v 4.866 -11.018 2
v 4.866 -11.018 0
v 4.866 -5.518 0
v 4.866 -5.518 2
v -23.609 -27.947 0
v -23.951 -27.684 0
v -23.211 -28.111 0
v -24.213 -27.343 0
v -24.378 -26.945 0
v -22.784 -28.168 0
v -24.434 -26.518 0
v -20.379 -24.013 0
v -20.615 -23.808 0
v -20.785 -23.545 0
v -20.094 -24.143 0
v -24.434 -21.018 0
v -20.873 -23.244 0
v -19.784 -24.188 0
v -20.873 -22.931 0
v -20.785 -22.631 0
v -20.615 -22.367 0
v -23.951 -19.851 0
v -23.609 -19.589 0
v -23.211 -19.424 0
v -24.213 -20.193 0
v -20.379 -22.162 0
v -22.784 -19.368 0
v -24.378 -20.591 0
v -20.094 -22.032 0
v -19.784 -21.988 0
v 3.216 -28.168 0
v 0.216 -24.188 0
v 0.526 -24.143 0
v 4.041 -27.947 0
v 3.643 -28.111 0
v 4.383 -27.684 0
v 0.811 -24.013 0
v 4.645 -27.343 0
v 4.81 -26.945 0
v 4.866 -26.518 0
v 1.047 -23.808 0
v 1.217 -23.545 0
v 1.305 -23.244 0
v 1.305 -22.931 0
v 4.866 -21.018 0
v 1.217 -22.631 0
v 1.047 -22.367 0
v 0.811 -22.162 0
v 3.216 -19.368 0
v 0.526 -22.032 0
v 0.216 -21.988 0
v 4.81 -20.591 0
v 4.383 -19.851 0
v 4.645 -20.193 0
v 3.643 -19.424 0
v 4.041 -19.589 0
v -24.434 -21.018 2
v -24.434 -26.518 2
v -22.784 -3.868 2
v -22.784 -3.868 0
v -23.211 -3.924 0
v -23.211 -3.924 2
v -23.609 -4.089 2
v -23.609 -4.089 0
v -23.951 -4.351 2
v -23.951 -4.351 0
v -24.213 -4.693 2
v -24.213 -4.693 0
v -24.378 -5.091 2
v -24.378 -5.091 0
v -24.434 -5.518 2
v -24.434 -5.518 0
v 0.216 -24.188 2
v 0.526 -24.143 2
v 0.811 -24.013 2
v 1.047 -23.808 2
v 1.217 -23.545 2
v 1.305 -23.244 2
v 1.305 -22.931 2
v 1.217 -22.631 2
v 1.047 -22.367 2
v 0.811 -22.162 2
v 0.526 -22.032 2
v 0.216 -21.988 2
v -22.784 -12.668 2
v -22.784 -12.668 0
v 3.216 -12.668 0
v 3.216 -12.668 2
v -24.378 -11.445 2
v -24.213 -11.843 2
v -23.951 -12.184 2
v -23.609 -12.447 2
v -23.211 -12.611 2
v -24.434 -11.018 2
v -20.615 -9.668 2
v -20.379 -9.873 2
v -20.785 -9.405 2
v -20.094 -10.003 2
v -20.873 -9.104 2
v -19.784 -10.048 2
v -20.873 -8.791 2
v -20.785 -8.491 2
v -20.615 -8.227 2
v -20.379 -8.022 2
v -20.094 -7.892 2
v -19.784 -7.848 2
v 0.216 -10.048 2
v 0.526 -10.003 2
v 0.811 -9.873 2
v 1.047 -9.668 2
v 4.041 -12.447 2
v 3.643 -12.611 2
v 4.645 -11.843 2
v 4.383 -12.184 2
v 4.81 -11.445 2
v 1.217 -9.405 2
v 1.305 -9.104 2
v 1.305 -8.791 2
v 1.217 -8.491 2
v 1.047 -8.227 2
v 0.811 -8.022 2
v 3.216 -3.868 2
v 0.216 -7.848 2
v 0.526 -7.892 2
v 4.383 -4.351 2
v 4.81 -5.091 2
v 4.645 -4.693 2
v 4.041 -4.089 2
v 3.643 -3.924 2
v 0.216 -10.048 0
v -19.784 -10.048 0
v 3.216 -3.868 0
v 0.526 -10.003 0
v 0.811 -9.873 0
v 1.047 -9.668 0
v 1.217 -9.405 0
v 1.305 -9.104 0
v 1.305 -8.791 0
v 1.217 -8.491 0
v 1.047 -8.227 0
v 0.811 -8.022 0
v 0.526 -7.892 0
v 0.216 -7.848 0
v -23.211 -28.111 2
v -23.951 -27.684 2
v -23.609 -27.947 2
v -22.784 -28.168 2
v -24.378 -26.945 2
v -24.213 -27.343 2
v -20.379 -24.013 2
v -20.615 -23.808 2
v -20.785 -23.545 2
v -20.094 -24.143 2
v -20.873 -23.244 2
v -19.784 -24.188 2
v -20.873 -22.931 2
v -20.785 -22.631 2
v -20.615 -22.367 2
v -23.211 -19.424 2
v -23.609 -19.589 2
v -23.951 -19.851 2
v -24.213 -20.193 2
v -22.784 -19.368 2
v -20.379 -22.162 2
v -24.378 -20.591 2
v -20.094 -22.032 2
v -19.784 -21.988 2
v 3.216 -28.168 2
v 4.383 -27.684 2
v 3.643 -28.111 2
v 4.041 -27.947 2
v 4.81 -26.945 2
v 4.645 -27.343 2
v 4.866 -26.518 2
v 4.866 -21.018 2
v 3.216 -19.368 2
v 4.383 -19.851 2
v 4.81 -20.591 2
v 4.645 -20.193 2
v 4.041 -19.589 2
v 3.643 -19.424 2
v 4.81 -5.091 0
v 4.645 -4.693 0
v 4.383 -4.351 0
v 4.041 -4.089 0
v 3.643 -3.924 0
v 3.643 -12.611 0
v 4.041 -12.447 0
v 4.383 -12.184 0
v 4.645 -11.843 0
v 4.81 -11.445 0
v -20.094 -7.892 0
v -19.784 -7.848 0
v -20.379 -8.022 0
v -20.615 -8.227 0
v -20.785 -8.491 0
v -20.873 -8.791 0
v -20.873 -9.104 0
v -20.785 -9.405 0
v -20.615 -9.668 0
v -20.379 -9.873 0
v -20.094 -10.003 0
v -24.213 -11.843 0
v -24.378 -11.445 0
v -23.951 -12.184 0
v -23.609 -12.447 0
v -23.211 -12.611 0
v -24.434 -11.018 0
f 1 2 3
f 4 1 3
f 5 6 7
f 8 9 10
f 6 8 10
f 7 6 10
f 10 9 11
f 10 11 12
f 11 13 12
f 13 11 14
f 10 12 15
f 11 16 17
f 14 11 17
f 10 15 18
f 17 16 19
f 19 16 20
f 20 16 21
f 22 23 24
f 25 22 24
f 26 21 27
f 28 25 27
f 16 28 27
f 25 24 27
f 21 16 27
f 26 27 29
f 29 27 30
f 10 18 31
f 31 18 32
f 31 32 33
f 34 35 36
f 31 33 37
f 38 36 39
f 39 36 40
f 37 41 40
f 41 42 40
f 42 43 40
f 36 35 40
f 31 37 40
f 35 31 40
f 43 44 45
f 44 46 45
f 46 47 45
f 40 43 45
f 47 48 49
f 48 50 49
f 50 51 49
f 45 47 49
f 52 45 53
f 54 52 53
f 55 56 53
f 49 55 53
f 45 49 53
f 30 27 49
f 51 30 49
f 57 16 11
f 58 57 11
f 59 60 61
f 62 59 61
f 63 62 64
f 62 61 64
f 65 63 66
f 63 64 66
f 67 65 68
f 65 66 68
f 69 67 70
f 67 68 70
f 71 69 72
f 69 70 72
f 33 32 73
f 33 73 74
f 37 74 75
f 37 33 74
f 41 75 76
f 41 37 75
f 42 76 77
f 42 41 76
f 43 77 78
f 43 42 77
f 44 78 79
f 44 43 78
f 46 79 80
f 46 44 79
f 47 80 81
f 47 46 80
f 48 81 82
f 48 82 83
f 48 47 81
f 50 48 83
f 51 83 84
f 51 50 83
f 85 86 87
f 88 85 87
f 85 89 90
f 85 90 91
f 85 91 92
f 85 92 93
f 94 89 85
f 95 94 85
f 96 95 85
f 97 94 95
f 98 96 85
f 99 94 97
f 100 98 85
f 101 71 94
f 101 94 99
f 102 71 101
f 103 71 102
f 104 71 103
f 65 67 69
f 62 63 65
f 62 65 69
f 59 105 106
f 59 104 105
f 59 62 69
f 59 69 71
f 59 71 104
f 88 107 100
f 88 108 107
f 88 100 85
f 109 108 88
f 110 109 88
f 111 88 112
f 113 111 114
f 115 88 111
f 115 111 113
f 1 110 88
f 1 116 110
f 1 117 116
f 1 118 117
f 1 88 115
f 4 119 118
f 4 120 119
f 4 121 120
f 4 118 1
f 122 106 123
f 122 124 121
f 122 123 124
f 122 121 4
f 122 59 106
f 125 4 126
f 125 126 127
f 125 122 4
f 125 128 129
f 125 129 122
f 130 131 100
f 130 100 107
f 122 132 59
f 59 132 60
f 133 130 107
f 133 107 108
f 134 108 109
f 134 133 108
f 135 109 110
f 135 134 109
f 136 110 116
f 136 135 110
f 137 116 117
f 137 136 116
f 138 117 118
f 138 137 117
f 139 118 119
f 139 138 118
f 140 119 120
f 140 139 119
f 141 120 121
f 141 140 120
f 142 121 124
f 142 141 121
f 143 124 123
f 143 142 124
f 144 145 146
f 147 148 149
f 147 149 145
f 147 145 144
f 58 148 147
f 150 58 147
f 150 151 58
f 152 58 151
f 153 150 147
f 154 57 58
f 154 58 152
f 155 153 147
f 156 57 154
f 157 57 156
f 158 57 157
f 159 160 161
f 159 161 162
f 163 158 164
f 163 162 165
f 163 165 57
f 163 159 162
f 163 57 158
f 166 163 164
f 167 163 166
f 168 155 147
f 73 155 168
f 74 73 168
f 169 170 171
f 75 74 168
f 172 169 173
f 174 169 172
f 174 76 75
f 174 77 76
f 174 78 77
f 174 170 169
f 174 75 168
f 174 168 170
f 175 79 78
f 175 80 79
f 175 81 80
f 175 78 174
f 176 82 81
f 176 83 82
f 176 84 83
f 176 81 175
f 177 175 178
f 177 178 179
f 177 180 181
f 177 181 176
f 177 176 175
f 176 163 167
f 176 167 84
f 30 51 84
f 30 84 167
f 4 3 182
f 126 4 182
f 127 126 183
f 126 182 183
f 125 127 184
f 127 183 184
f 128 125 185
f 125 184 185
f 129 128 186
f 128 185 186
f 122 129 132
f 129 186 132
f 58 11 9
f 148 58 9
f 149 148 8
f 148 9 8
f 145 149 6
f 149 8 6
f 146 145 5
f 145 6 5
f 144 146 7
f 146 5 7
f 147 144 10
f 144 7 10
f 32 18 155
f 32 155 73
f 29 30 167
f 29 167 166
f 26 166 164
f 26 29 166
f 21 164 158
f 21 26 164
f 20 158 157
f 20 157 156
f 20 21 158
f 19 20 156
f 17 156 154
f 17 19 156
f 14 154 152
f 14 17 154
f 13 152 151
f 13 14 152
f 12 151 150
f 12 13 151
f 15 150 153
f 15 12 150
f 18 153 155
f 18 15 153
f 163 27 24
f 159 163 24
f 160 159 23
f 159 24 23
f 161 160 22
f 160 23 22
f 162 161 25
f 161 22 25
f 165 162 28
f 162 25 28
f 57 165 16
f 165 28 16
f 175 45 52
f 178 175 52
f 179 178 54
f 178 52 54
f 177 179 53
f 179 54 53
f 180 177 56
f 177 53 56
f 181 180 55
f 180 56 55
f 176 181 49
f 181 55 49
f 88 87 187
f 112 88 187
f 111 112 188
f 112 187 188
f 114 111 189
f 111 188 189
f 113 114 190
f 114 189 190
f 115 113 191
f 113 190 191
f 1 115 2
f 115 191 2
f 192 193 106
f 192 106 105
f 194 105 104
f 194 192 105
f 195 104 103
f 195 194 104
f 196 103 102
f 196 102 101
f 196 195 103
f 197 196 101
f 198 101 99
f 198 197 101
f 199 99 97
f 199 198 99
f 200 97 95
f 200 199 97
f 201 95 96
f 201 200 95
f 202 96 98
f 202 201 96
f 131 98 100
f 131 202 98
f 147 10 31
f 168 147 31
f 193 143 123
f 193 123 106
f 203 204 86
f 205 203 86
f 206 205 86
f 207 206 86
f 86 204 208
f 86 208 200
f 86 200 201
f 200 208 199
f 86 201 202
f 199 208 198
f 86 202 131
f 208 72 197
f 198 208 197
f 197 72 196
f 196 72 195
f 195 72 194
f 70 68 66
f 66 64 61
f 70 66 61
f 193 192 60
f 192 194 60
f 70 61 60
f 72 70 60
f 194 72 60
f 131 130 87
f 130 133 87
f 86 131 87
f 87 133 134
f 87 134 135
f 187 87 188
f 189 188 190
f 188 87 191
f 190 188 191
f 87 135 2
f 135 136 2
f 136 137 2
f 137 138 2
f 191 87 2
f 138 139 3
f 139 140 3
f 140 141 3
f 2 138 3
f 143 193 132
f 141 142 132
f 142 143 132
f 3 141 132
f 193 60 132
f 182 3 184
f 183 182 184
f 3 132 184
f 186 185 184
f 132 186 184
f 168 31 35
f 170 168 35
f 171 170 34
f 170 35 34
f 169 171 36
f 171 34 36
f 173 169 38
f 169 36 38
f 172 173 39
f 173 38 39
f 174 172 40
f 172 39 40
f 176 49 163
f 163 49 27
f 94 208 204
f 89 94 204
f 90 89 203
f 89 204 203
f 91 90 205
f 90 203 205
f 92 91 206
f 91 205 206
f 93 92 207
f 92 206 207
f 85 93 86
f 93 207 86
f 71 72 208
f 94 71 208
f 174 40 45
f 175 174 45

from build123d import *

# Parameters (mm, degrees)
SALIENTE_EXTRUIR1_DEPTH   = 2
SALIENTE_EXTRUIR1_2_DEPTH = 2
CORTAR_EXTRUIR1_START     = -2
CORTAR_EXTRUIR1_DEPTH     = 2


with BuildPart() as part:
    # Croquis1 → Saliente-Extruir1 (new body)
    with BuildSketch(Plane.XY):
        with BuildLine():
            Line((-24.78394795, -5.517569271), (-24.78394795, -11.017569271))
            ThreePointArc((-24.78394795, -11.017569271), (-24.198161512, -12.431782834), (-22.78394795, -13.017569271))
            Line((-22.78394795, -13.017569271), (3.21605205, -13.017569271))
            ThreePointArc((3.21605205, -13.017569271), (4.630265612, -12.431782834), (5.21605205, -11.017569271))
            Line((5.21605205, -11.017569271), (5.21605205, -5.517569271))
            ThreePointArc((5.21605205, -5.517569271), (4.630265612, -4.103355709), (3.21605205, -3.517569271))
            Line((3.21605205, -3.517569271), (-22.78394795, -3.517569271))
            ThreePointArc((-22.78394795, -3.517569271), (-24.198161512, -4.103355709), (-24.78394795, -5.517569271))
        make_face()
        with BuildLine():
            Line((-19.783948841, -10.047569271), (0.216052941, -10.047569271))
            ThreePointArc((0.216052941, -10.047569271), (1.316052941, -8.947569271), (0.216052941, -7.847569271))
            Line((0.216052941, -7.847569271), (-19.783947059, -7.847569271))
            ThreePointArc((-19.783947059, -7.847569271), (-20.883947954, -8.947568381), (-19.783948841, -10.047569271))
        make_face(mode=Mode.SUBTRACT)
    extrude(amount=SALIENTE_EXTRUIR1_DEPTH)


with BuildPart() as body_2:
    # Croquis1 → Saliente-Extruir1 2 (new body)
    with BuildSketch(Plane.XY):
        with BuildLine():
            Line((5.21605205, -26.517569271), (5.21605205, -21.017569271))
            ThreePointArc((5.21605205, -21.017569271), (4.630265612, -19.603355709), (3.21605205, -19.017569271))
            Line((3.21605205, -19.017569271), (-22.78394795, -19.017569271))
            ThreePointArc((-22.78394795, -19.017569271), (-24.198161512, -19.603355709), (-24.78394795, -21.017569271))
            Line((-24.78394795, -21.017569271), (-24.78394795, -26.517569271))
            ThreePointArc((-24.78394795, -26.517569271), (-24.198161512, -27.931782834), (-22.78394795, -28.517569271))
            Line((-22.78394795, -28.517569271), (3.21605205, -28.517569271))
            ThreePointArc((3.21605205, -28.517569271), (4.630265612, -27.931782834), (5.21605205, -26.517569271))
        make_face()
        with BuildLine():
            Line((-19.783947059, -24.187569271), (0.216052941, -24.187569271))
            ThreePointArc((0.216052941, -24.187569271), (1.316052941, -23.087569271), (0.216052941, -21.987569271))
            Line((0.216052941, -21.987569271), (-19.783948841, -21.987569271))
            ThreePointArc((-19.783948841, -21.987569271), (-20.883947954, -23.087570162), (-19.783947059, -24.187569271))
        make_face(mode=Mode.SUBTRACT)
    extrude(amount=SALIENTE_EXTRUIR1_2_DEPTH)


with BuildPart() as cortar_extruir1_tool:
    # Croquis2 → Cortar-Extruir1 (new body)
    # profile 1 of 2: a face of its own
    with BuildSketch(Plane.XY.offset(2).offset(CORTAR_EXTRUIR1_START)):
        with BuildLine():
            Line((5.21605205, -26.517569271), (5.21605205, -21.017569271))
            ThreePointArc((5.21605205, -21.017569271), (4.630265612, -19.603355709), (3.21605205, -19.017569271))
            Line((3.21605205, -19.017569271), (-22.78394795, -19.017569271))
            ThreePointArc((-22.78394795, -19.017569271), (-24.198161512, -19.603355709), (-24.78394795, -21.017569271))
            Line((-24.78394795, -21.017569271), (-24.78394795, -26.517569271))
            ThreePointArc((-24.78394795, -26.517569271), (-24.198161512, -27.931782834), (-22.78394795, -28.517569271))
            Line((-22.78394795, -28.517569271), (3.21605205, -28.517569271))
            ThreePointArc((3.21605205, -28.517569271), (4.630265612, -27.931782834), (5.21605205, -26.517569271))
        make_face()
        with BuildLine():
            Line((4.86605205, -26.517569271), (4.86605205, -21.017569271))
            ThreePointArc((4.86605205, -21.017569271), (4.382778239, -19.850843082), (3.21605205, -19.367569271))
            Line((3.21605205, -19.367569271), (-22.78394795, -19.367569271))
            ThreePointArc((-22.78394795, -19.367569271), (-23.950674139, -19.850843082), (-24.43394795, -21.017569271))
            Line((-24.43394795, -21.017569271), (-24.43394795, -26.517569271))
            ThreePointArc((-24.43394795, -26.517569271), (-23.950674139, -27.68429546), (-22.78394795, -28.167569271))
            Line((-22.78394795, -28.167569271), (3.21605205, -28.167569271))
            ThreePointArc((3.21605205, -28.167569271), (4.382778239, -27.68429546), (4.86605205, -26.517569271))
        make_face(mode=Mode.SUBTRACT)
    # profile 2 of 2: a face of its own
    with BuildSketch(Plane.XY.offset(2).offset(CORTAR_EXTRUIR1_START)):
        with BuildLine():
            Line((-24.78394795, -5.517569271), (-24.78394795, -11.017569271))
            ThreePointArc((-24.78394795, -11.017569271), (-24.198161512, -12.431782834), (-22.78394795, -13.017569271))
            Line((-22.78394795, -13.017569271), (3.21605205, -13.017569271))
            ThreePointArc((3.21605205, -13.017569271), (4.630265612, -12.431782834), (5.21605205, -11.017569271))
            Line((5.21605205, -11.017569271), (5.21605205, -5.517569271))
            ThreePointArc((5.21605205, -5.517569271), (4.630265612, -4.103355709), (3.21605205, -3.517569271))
            Line((3.21605205, -3.517569271), (-22.78394795, -3.517569271))
            ThreePointArc((-22.78394795, -3.517569271), (-24.198161512, -4.103355709), (-24.78394795, -5.517569271))
        make_face()
        with BuildLine():
            Line((-24.43394795, -5.517569271), (-24.43394795, -11.017569271))
            ThreePointArc((-24.43394795, -11.017569271), (-23.950674139, -12.18429546), (-22.78394795, -12.667569271))
            Line((-22.78394795, -12.667569271), (3.21605205, -12.667569271))
            ThreePointArc((3.21605205, -12.667569271), (4.382778239, -12.18429546), (4.86605205, -11.017569271))
            Line((4.86605205, -11.017569271), (4.86605205, -5.517569271))
            ThreePointArc((4.86605205, -5.517569271), (4.382778239, -4.350843082), (3.21605205, -3.867569271))
            Line((3.21605205, -3.867569271), (-22.78394795, -3.867569271))
            ThreePointArc((-22.78394795, -3.867569271), (-23.950674139, -4.350843082), (-24.43394795, -5.517569271))
        make_face(mode=Mode.SUBTRACT)
    extrude(amount=CORTAR_EXTRUIR1_DEPTH)


with BuildPart() as part_1:
    add(part.part)

    # Cortar-Extruir1: cut by cortar_extruir1_tool
    add(cortar_extruir1_tool.part, mode=Mode.SUBTRACT)


with BuildPart() as body_2_1:
    add(body_2.part)

    # Cortar-Extruir1: cut by cortar_extruir1_tool
    add(cortar_extruir1_tool.part, mode=Mode.SUBTRACT)


solid = Compound([part_1.part, body_2_1.part])
